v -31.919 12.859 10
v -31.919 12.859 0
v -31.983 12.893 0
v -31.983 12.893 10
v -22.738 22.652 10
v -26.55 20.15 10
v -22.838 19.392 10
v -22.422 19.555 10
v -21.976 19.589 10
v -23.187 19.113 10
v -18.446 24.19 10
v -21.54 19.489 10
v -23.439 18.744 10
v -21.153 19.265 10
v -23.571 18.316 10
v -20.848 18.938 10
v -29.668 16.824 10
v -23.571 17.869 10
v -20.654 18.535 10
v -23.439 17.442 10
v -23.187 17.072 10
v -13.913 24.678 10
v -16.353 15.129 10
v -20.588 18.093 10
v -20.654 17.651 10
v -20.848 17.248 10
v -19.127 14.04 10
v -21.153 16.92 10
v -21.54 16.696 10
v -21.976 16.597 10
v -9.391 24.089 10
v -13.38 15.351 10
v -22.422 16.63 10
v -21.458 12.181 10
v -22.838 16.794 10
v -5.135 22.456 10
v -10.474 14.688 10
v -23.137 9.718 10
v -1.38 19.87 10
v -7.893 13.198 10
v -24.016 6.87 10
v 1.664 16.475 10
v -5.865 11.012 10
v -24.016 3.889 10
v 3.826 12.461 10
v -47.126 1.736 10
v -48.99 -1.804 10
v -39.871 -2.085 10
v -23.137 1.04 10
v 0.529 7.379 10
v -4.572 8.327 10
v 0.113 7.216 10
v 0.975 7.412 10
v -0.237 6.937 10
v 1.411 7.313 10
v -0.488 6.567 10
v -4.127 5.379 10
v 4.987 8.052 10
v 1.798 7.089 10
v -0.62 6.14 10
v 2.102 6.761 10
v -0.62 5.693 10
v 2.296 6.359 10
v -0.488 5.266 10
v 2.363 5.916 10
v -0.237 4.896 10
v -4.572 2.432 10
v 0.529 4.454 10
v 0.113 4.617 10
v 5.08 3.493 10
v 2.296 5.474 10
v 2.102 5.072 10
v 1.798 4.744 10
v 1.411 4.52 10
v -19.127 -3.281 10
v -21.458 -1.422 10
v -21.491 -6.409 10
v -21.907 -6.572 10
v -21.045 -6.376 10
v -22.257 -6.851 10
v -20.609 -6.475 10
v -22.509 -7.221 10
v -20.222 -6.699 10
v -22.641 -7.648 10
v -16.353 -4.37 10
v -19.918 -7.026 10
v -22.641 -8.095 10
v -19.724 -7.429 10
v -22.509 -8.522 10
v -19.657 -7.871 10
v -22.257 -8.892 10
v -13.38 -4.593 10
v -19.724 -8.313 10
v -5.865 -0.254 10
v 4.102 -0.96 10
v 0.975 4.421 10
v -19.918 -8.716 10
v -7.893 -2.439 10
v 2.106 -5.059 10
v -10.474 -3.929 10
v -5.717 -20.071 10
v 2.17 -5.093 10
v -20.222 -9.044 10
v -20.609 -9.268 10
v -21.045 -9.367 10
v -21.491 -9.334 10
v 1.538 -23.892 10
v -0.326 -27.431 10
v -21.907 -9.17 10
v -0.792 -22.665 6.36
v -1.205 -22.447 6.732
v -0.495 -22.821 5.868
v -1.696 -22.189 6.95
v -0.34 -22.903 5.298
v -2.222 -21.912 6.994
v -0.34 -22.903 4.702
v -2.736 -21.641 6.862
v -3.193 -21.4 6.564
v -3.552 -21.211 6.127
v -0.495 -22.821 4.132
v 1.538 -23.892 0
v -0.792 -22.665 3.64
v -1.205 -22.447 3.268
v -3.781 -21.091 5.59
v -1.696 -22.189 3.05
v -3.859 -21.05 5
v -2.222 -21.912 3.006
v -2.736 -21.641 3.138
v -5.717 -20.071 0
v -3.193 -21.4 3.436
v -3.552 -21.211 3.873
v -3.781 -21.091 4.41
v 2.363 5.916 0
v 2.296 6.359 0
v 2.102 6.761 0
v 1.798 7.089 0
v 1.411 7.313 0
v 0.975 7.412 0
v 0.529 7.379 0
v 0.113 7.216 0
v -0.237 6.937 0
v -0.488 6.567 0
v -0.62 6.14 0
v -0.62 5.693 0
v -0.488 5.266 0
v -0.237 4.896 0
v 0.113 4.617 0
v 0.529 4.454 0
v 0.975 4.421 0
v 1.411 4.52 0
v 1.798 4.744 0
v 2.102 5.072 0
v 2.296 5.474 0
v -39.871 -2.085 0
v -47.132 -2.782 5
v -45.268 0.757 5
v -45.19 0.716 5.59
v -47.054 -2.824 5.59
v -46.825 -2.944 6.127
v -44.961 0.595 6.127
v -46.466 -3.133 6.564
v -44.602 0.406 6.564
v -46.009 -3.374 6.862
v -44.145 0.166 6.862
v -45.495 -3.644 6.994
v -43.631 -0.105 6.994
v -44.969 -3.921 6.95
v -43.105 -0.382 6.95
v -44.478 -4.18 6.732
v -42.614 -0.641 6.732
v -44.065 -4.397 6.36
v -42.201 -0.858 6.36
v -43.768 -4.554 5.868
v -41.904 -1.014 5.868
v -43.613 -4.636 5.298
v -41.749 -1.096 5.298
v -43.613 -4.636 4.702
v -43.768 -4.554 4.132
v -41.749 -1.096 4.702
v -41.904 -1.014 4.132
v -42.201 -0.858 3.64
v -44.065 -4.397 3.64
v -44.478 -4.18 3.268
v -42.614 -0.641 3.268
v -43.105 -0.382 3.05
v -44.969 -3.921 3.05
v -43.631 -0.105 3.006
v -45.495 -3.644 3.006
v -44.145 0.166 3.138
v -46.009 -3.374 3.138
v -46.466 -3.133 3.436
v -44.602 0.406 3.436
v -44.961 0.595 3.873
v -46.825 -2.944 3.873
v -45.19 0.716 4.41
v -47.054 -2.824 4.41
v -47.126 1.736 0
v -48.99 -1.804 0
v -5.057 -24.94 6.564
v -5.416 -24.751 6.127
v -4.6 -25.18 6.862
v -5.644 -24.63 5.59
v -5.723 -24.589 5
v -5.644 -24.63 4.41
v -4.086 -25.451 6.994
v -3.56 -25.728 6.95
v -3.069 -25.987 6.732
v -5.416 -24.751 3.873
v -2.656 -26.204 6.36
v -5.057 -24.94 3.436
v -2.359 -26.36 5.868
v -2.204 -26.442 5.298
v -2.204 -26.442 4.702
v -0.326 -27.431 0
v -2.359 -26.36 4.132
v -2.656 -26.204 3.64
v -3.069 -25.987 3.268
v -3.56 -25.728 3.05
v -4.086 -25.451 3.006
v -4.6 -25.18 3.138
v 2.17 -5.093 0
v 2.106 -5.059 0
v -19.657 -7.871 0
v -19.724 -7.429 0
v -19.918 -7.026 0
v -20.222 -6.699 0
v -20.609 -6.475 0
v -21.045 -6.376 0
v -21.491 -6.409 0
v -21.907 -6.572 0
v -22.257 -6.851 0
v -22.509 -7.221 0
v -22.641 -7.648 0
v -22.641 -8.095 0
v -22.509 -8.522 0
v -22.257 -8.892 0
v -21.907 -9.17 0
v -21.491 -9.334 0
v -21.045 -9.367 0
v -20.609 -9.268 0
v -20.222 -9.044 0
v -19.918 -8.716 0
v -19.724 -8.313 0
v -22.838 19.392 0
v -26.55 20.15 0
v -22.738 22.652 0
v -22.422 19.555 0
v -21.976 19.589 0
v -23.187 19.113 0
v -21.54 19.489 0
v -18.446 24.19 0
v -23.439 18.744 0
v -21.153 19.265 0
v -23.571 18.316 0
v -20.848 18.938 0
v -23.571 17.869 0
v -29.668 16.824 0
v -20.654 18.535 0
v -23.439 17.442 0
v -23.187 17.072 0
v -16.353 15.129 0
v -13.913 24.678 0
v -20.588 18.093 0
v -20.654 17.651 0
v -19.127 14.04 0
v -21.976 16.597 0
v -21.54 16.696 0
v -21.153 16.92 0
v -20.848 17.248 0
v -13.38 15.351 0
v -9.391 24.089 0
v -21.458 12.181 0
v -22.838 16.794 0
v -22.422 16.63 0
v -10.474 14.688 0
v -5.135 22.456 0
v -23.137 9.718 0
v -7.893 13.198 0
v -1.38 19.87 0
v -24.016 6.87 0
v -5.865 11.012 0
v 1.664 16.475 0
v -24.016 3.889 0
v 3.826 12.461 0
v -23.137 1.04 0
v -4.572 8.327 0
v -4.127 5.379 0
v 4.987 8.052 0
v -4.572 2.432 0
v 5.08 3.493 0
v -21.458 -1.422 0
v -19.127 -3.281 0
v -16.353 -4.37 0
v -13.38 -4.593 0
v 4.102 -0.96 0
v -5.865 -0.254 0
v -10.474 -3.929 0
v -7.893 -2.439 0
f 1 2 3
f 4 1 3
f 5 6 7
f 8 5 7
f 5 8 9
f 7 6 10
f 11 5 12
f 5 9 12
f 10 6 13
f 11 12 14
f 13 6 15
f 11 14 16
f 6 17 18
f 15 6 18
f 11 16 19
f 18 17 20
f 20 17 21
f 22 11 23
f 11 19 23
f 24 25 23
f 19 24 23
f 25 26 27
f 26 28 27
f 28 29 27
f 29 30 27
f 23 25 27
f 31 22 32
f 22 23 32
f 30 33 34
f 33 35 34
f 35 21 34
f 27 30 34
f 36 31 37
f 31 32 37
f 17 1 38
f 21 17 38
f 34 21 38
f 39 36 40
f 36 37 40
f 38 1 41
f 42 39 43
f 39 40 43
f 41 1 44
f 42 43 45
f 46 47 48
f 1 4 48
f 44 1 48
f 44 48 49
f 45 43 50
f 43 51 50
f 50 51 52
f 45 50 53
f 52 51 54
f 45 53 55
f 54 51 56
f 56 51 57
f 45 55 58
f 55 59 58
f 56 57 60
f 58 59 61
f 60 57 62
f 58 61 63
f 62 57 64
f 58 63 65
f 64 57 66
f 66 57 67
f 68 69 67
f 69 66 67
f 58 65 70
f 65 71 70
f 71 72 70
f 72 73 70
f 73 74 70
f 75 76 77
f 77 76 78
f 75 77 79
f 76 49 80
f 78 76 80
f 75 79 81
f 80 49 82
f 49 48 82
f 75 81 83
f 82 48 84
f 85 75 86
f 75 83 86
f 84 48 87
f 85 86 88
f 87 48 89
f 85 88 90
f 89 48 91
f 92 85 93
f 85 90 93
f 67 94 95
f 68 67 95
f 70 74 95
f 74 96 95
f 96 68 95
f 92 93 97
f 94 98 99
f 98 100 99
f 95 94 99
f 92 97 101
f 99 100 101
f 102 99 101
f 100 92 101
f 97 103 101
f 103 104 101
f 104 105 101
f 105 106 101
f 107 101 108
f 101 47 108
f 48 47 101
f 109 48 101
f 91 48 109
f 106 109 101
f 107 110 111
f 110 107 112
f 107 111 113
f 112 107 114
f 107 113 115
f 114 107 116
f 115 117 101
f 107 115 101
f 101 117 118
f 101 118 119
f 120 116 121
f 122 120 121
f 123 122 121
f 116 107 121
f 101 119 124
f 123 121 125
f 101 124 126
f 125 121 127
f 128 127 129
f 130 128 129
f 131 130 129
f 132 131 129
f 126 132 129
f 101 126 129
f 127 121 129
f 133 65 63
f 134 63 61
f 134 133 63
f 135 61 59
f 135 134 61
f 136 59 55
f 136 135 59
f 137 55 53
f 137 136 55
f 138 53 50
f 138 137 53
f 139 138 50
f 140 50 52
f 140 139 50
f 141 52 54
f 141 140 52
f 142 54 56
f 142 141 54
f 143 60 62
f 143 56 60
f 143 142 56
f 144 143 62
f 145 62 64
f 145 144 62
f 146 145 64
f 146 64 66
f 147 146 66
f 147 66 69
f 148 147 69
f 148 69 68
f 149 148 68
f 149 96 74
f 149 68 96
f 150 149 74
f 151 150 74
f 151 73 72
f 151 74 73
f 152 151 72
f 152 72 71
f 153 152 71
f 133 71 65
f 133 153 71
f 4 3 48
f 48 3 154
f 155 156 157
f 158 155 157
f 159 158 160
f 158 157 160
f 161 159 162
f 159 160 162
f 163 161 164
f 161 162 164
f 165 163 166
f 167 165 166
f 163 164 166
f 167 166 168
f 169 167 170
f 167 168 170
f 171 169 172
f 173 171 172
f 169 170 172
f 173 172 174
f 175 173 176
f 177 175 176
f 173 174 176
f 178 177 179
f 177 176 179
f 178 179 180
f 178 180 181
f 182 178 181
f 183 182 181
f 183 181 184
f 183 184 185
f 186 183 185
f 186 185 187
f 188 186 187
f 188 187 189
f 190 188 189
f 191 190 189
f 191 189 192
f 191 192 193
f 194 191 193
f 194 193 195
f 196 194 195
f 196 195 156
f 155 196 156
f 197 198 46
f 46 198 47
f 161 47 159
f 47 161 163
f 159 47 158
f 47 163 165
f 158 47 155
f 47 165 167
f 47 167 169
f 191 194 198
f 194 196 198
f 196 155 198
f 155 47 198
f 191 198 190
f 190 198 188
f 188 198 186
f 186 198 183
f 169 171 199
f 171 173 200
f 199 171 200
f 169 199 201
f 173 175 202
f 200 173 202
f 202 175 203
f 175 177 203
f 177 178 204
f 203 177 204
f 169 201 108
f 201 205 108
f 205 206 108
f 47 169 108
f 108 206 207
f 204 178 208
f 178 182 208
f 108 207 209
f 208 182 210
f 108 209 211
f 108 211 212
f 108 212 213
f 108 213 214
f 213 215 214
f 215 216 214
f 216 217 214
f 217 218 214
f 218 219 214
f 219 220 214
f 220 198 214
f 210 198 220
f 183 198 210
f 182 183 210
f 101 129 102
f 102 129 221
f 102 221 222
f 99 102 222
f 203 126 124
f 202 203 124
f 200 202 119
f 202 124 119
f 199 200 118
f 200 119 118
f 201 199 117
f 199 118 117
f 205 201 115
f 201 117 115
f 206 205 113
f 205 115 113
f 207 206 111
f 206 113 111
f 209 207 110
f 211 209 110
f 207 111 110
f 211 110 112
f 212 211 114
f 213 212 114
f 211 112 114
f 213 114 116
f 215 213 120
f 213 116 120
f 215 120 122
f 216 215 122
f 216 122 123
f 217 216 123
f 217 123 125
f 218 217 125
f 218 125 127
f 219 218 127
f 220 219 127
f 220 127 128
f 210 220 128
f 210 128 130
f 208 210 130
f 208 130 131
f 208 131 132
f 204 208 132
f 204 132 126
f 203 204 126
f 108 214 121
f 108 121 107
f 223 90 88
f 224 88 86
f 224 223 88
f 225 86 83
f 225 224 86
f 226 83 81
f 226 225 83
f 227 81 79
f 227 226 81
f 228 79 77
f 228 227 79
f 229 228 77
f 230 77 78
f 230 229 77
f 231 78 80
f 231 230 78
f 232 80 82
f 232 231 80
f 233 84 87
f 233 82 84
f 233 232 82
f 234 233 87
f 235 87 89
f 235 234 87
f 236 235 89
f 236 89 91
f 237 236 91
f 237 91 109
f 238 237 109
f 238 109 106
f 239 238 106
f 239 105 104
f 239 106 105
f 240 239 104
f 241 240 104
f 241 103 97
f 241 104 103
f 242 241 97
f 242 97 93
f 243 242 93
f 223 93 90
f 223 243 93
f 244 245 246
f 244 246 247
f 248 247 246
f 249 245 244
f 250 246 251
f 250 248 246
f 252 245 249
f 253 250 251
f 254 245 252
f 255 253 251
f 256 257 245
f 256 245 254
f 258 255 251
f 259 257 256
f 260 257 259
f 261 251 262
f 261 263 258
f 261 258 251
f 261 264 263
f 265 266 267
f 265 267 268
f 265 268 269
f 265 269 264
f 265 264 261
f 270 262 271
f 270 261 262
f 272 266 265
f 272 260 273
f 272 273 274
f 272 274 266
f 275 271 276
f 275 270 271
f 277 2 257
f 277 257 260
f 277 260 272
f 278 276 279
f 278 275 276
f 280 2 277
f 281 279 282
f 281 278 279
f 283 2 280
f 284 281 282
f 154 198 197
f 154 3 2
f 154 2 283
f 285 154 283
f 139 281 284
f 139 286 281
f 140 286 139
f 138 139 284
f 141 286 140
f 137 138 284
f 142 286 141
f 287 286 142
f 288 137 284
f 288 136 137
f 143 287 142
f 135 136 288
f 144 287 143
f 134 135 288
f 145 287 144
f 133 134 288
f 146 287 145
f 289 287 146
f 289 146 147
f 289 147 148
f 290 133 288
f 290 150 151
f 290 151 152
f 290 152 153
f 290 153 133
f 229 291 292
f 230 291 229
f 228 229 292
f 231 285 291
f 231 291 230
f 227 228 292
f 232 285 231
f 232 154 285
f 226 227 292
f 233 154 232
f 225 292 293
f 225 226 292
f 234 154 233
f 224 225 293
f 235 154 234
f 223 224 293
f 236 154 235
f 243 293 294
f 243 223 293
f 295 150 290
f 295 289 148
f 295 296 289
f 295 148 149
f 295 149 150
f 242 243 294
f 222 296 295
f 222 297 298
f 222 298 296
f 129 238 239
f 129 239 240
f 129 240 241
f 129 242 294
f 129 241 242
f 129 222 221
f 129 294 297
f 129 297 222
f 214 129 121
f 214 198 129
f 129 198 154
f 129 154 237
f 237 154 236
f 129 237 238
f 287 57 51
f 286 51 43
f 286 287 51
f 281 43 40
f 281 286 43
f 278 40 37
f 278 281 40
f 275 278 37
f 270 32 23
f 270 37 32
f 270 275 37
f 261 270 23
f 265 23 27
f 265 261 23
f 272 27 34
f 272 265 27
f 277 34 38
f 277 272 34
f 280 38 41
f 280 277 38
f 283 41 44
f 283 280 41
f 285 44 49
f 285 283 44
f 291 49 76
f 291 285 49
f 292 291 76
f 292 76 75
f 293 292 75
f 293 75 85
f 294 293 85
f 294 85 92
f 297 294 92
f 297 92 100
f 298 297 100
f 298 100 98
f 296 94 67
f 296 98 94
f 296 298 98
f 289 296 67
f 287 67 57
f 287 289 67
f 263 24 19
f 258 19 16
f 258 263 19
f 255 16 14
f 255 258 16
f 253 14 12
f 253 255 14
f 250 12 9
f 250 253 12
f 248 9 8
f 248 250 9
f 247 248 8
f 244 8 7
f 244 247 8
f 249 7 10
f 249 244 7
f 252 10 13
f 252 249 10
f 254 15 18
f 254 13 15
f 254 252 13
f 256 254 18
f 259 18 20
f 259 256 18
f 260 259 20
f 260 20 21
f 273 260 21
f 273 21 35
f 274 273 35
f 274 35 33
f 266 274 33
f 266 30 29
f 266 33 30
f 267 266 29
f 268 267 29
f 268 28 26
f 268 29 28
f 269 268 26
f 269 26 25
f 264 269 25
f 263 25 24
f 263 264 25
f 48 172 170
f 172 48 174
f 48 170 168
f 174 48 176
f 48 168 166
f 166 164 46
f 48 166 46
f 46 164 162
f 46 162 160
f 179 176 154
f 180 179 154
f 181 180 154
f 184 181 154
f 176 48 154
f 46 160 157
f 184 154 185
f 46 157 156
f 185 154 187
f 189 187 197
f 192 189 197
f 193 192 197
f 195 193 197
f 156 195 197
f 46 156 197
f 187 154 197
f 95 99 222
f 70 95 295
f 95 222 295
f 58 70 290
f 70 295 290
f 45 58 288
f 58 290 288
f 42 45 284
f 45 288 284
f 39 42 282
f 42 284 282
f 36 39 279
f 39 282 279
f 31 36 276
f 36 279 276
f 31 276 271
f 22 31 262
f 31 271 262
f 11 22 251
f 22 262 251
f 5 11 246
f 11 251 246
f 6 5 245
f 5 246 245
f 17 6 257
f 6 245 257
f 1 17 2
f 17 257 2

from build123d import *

# Parameters (mm, degrees)
SKETCH1_R           = 19.3
SKETCH1_R_2         = 10
SKETCH1_R_3         = 1.5
BOSS_EXTRUDE1_DEPTH = 10
SKETCH2_W           = 55
SKETCH2_H           = 10
BOSS_EXTRUDE2_DEPTH = 50
CUT_EXTRUDE1_DEPTH  = 50
SKETCH5_R           = 2
CUT_EXTRUDE2_DEPTH  = 50
SKETCH1_2_R         = 10
SKETCH1_2_R_2       = 1.5
CUT_EXTRUDE3_DEPTH  = 50


with BuildPart() as part:
    # Sketch1 → Boss-Extrude1 (new body)
    with BuildSketch(Plane.XY):
        with Locations((-14.127422454, 5.37928778)):
            Circle(SKETCH1_R)
        with Locations((-14.127422454, 5.37928778)):
            Circle(SKETCH1_R_2, mode=Mode.SUBTRACT)
        with Locations((0.862954929, 5.91648973)):
            Circle(SKETCH1_R_3, mode=Mode.SUBTRACT)
        with Locations((-22.08784168, 18.092734431)):
            Circle(SKETCH1_R_3, mode=Mode.SUBTRACT)
        with Locations((-21.15738061, -7.87136082)):
            Circle(SKETCH1_R_3, mode=Mode.SUBTRACT)
    extrude(amount=BOSS_EXTRUDE1_DEPTH)

    # Sketch2 → Boss-Extrude2 (add)
    with BuildSketch(Plane(origin=(-14.175728754, -26.918620376, 0), x_dir=(0.8848093624477475, -0.46595320808511503, 0), z_dir=(-0.46595320808511503, -0.8848093624477475, 0))):
        with Locations((-15.006572053, 5)):
            Rectangle(SKETCH2_W, SKETCH2_H)
    extrude(amount=-BOSS_EXTRUDE2_DEPTH)

    # Sketch4 → Cut-Extrude1 (cut)
    with BuildSketch(Plane(origin=(0, 0, 0), x_dir=(-1, 0, 0), z_dir=(0, 0, -1))):
        with BuildLine():
            Line((-20.176233667, 11.500494914), (-1.538105343, -23.891879583))
            Line((-1.538105343, -23.891879583), (5.717331429, -20.071063277))
            Line((5.717331429, -20.071063277), (-2.170378194, -5.092908386))
            Line((-2.170378194, -5.092908386), (-2.106184539, -5.059103093))
            ThreePointArc((-2.106184539, -5.059103093), (5.134525538, 22.456108476), (31.919069541, 12.859080153))
            Line((31.919069541, 12.859080153), (31.983263196, 12.892885446))
            Line((31.983263196, 12.892885446), (39.870972819, -2.085269445))
            Line((39.870972819, -2.085269445), (47.126409591, 1.735546861))
            Line((47.126409591, 1.735546861), (28.488281268, 37.127921359))
            Line((28.488281268, 37.127921359), (-20.176233667, 11.500494914))
        make_face()
        Polygon((48.990222424, -1.803690589), (0.325707489, -27.431117033), (3.121426738, -32.739973208), (51.785941672, -7.112546763), align=None)
    extrude(amount=-CUT_EXTRUDE1_DEPTH, mode=Mode.SUBTRACT)

    # Sketch5 → Cut-Extrude2 (cut)
    with BuildSketch(Plane(origin=(-9.516196674, -18.070526751, 0), x_dir=(0.8848093624477471, -0.4659532080851159, 0), z_dir=(0.4659532080851159, 0.8848093624477471, 0))):
        with Locations((-38.406572053, -5)):
            Circle(SKETCH5_R)
        with Locations((8.393427947, -5)):
            Circle(SKETCH5_R)
    extrude(amount=-CUT_EXTRUDE2_DEPTH, mode=Mode.SUBTRACT)

    # Sketch1<2> → Cut-Extrude3 (cut)
    with BuildSketch(Plane.XY):
        with Locations((-14.127422454, 5.37928778)):
            Circle(SKETCH1_2_R)
        with Locations((0.862954929, 5.91648973)):
            Circle(SKETCH1_2_R_2)
        with Locations((-22.08784168, 18.092734431)):
            Circle(SKETCH1_2_R_2)
        with Locations((-21.15738061, -7.87136082)):
            Circle(SKETCH1_2_R_2)
    extrude(amount=CUT_EXTRUDE3_DEPTH, mode=Mode.SUBTRACT)


solid = part.part
